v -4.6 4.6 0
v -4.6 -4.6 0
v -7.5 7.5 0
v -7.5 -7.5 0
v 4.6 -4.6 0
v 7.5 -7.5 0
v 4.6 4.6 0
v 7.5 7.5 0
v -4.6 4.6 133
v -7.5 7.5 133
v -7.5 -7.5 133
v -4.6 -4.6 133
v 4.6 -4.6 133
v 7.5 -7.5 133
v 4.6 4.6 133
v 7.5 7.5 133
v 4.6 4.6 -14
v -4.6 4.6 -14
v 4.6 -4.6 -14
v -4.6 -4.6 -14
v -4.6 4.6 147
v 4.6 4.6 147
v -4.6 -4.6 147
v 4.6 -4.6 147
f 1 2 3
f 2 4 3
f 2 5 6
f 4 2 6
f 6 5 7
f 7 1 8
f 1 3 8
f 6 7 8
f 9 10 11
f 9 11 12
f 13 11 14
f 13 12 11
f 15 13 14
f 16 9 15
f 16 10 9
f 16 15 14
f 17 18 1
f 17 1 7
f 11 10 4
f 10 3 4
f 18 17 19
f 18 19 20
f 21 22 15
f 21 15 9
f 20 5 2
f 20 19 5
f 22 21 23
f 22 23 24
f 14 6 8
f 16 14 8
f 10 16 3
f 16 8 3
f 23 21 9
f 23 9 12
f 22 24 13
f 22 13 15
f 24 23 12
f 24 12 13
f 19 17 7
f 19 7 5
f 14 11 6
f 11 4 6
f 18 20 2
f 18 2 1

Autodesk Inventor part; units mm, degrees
ref_plane "YZ Plane" through (0, 0, 0) normal (1, 0, 0) x (0, 1, 0)
ref_plane "XZ Plane" through (0, 0, 0) normal (0, 1, 0) x (-1, 0, 0)
ref_plane "XY Plane" through (0, 0, 0) normal (0, 0, 1) x (1, 0, 0)
sketch "Sketch1" plane through (0, 0, 0) normal (0, 0, 1) x (1, 0, 0)
  line L0 (-7.5, -7.5) -> (7.5, -7.5)
  line L1 (7.5, -7.5) -> (7.5, 7.5)
  line L2 (7.5, 7.5) -> (-7.5, 7.5)
  line L3 (-7.5, 7.5) -> (-7.5, -7.5)
  line L4 (-7.5, -7.5) -> (7.5, 7.5) construction
  line L5 (7.5, -7.5) -> (-7.5, 7.5) construction
  point P0 (0, 0)
  dimension "d0" = 15
  dimension "d1" = 15
extrude "Extrusion1" add sketch "Sketch1" along normal blind 133
ref_plane "Work Plane1" through (0, 0, 66.5) normal (0, 0, 1) x (1, 0, 0)
sketch "Sketch2" plane through (0, 0, 133) normal (0, 0, 1) x (1, 0, 0)
  line L0 (-5, -5) -> (5, -5)
  line L1 (5, -5) -> (5, 5)
  line L2 (5, 5) -> (-5, 5)
  line L3 (-5, 5) -> (-5, -5)
  line L4 (-5, -5) -> (5, 5) construction
  line L5 (5, -5) -> (-5, 5) construction
  point P0 (0, 0)
  dimension "d4" = 10
  dimension "d5" = 10
extrude "Extrusion2" add sketch "Sketch2" along normal blind 14
mirror "Mirror1" about plane through (0, 0, 66.5) normal (0, 0, 1) of "Extrusion2"
sketch "Sketch3" plane through (0, 0, 147) normal (0, 0, 1) x (1, 0, 0)
  line L0 (-5, -5) -> (5, -5) projected
  line L1 (5, -5) -> (5, 5) projected
  line L2 (5, 5) -> (-5, 5) projected
  line L3 (-5, 5) -> (-5, -5) projected
  line L4 (-4.6, -4.6) -> (4.6, -4.6)
  line L5 (4.6, -4.6) -> (4.6, 4.6)
  line L6 (4.6, 4.6) -> (-4.6, 4.6)
  line L7 (-4.6, 4.6) -> (-4.6, -4.6)
  point P0 (0, 0)
  dimension "d8" = 0.4
extrude "Extrusion3" cut sketch "Sketch3" against normal up to surface (14 mm away)
mirror "Mirror2" about plane through (0, 0, 66.5) normal (0, 0, 1) of "Extrusion2"
mirror "Mirror3" about plane through (0, 0, 66.5) normal (0, 0, 1) of "Extrusion3"
properties part number "Upper Beam Support"
